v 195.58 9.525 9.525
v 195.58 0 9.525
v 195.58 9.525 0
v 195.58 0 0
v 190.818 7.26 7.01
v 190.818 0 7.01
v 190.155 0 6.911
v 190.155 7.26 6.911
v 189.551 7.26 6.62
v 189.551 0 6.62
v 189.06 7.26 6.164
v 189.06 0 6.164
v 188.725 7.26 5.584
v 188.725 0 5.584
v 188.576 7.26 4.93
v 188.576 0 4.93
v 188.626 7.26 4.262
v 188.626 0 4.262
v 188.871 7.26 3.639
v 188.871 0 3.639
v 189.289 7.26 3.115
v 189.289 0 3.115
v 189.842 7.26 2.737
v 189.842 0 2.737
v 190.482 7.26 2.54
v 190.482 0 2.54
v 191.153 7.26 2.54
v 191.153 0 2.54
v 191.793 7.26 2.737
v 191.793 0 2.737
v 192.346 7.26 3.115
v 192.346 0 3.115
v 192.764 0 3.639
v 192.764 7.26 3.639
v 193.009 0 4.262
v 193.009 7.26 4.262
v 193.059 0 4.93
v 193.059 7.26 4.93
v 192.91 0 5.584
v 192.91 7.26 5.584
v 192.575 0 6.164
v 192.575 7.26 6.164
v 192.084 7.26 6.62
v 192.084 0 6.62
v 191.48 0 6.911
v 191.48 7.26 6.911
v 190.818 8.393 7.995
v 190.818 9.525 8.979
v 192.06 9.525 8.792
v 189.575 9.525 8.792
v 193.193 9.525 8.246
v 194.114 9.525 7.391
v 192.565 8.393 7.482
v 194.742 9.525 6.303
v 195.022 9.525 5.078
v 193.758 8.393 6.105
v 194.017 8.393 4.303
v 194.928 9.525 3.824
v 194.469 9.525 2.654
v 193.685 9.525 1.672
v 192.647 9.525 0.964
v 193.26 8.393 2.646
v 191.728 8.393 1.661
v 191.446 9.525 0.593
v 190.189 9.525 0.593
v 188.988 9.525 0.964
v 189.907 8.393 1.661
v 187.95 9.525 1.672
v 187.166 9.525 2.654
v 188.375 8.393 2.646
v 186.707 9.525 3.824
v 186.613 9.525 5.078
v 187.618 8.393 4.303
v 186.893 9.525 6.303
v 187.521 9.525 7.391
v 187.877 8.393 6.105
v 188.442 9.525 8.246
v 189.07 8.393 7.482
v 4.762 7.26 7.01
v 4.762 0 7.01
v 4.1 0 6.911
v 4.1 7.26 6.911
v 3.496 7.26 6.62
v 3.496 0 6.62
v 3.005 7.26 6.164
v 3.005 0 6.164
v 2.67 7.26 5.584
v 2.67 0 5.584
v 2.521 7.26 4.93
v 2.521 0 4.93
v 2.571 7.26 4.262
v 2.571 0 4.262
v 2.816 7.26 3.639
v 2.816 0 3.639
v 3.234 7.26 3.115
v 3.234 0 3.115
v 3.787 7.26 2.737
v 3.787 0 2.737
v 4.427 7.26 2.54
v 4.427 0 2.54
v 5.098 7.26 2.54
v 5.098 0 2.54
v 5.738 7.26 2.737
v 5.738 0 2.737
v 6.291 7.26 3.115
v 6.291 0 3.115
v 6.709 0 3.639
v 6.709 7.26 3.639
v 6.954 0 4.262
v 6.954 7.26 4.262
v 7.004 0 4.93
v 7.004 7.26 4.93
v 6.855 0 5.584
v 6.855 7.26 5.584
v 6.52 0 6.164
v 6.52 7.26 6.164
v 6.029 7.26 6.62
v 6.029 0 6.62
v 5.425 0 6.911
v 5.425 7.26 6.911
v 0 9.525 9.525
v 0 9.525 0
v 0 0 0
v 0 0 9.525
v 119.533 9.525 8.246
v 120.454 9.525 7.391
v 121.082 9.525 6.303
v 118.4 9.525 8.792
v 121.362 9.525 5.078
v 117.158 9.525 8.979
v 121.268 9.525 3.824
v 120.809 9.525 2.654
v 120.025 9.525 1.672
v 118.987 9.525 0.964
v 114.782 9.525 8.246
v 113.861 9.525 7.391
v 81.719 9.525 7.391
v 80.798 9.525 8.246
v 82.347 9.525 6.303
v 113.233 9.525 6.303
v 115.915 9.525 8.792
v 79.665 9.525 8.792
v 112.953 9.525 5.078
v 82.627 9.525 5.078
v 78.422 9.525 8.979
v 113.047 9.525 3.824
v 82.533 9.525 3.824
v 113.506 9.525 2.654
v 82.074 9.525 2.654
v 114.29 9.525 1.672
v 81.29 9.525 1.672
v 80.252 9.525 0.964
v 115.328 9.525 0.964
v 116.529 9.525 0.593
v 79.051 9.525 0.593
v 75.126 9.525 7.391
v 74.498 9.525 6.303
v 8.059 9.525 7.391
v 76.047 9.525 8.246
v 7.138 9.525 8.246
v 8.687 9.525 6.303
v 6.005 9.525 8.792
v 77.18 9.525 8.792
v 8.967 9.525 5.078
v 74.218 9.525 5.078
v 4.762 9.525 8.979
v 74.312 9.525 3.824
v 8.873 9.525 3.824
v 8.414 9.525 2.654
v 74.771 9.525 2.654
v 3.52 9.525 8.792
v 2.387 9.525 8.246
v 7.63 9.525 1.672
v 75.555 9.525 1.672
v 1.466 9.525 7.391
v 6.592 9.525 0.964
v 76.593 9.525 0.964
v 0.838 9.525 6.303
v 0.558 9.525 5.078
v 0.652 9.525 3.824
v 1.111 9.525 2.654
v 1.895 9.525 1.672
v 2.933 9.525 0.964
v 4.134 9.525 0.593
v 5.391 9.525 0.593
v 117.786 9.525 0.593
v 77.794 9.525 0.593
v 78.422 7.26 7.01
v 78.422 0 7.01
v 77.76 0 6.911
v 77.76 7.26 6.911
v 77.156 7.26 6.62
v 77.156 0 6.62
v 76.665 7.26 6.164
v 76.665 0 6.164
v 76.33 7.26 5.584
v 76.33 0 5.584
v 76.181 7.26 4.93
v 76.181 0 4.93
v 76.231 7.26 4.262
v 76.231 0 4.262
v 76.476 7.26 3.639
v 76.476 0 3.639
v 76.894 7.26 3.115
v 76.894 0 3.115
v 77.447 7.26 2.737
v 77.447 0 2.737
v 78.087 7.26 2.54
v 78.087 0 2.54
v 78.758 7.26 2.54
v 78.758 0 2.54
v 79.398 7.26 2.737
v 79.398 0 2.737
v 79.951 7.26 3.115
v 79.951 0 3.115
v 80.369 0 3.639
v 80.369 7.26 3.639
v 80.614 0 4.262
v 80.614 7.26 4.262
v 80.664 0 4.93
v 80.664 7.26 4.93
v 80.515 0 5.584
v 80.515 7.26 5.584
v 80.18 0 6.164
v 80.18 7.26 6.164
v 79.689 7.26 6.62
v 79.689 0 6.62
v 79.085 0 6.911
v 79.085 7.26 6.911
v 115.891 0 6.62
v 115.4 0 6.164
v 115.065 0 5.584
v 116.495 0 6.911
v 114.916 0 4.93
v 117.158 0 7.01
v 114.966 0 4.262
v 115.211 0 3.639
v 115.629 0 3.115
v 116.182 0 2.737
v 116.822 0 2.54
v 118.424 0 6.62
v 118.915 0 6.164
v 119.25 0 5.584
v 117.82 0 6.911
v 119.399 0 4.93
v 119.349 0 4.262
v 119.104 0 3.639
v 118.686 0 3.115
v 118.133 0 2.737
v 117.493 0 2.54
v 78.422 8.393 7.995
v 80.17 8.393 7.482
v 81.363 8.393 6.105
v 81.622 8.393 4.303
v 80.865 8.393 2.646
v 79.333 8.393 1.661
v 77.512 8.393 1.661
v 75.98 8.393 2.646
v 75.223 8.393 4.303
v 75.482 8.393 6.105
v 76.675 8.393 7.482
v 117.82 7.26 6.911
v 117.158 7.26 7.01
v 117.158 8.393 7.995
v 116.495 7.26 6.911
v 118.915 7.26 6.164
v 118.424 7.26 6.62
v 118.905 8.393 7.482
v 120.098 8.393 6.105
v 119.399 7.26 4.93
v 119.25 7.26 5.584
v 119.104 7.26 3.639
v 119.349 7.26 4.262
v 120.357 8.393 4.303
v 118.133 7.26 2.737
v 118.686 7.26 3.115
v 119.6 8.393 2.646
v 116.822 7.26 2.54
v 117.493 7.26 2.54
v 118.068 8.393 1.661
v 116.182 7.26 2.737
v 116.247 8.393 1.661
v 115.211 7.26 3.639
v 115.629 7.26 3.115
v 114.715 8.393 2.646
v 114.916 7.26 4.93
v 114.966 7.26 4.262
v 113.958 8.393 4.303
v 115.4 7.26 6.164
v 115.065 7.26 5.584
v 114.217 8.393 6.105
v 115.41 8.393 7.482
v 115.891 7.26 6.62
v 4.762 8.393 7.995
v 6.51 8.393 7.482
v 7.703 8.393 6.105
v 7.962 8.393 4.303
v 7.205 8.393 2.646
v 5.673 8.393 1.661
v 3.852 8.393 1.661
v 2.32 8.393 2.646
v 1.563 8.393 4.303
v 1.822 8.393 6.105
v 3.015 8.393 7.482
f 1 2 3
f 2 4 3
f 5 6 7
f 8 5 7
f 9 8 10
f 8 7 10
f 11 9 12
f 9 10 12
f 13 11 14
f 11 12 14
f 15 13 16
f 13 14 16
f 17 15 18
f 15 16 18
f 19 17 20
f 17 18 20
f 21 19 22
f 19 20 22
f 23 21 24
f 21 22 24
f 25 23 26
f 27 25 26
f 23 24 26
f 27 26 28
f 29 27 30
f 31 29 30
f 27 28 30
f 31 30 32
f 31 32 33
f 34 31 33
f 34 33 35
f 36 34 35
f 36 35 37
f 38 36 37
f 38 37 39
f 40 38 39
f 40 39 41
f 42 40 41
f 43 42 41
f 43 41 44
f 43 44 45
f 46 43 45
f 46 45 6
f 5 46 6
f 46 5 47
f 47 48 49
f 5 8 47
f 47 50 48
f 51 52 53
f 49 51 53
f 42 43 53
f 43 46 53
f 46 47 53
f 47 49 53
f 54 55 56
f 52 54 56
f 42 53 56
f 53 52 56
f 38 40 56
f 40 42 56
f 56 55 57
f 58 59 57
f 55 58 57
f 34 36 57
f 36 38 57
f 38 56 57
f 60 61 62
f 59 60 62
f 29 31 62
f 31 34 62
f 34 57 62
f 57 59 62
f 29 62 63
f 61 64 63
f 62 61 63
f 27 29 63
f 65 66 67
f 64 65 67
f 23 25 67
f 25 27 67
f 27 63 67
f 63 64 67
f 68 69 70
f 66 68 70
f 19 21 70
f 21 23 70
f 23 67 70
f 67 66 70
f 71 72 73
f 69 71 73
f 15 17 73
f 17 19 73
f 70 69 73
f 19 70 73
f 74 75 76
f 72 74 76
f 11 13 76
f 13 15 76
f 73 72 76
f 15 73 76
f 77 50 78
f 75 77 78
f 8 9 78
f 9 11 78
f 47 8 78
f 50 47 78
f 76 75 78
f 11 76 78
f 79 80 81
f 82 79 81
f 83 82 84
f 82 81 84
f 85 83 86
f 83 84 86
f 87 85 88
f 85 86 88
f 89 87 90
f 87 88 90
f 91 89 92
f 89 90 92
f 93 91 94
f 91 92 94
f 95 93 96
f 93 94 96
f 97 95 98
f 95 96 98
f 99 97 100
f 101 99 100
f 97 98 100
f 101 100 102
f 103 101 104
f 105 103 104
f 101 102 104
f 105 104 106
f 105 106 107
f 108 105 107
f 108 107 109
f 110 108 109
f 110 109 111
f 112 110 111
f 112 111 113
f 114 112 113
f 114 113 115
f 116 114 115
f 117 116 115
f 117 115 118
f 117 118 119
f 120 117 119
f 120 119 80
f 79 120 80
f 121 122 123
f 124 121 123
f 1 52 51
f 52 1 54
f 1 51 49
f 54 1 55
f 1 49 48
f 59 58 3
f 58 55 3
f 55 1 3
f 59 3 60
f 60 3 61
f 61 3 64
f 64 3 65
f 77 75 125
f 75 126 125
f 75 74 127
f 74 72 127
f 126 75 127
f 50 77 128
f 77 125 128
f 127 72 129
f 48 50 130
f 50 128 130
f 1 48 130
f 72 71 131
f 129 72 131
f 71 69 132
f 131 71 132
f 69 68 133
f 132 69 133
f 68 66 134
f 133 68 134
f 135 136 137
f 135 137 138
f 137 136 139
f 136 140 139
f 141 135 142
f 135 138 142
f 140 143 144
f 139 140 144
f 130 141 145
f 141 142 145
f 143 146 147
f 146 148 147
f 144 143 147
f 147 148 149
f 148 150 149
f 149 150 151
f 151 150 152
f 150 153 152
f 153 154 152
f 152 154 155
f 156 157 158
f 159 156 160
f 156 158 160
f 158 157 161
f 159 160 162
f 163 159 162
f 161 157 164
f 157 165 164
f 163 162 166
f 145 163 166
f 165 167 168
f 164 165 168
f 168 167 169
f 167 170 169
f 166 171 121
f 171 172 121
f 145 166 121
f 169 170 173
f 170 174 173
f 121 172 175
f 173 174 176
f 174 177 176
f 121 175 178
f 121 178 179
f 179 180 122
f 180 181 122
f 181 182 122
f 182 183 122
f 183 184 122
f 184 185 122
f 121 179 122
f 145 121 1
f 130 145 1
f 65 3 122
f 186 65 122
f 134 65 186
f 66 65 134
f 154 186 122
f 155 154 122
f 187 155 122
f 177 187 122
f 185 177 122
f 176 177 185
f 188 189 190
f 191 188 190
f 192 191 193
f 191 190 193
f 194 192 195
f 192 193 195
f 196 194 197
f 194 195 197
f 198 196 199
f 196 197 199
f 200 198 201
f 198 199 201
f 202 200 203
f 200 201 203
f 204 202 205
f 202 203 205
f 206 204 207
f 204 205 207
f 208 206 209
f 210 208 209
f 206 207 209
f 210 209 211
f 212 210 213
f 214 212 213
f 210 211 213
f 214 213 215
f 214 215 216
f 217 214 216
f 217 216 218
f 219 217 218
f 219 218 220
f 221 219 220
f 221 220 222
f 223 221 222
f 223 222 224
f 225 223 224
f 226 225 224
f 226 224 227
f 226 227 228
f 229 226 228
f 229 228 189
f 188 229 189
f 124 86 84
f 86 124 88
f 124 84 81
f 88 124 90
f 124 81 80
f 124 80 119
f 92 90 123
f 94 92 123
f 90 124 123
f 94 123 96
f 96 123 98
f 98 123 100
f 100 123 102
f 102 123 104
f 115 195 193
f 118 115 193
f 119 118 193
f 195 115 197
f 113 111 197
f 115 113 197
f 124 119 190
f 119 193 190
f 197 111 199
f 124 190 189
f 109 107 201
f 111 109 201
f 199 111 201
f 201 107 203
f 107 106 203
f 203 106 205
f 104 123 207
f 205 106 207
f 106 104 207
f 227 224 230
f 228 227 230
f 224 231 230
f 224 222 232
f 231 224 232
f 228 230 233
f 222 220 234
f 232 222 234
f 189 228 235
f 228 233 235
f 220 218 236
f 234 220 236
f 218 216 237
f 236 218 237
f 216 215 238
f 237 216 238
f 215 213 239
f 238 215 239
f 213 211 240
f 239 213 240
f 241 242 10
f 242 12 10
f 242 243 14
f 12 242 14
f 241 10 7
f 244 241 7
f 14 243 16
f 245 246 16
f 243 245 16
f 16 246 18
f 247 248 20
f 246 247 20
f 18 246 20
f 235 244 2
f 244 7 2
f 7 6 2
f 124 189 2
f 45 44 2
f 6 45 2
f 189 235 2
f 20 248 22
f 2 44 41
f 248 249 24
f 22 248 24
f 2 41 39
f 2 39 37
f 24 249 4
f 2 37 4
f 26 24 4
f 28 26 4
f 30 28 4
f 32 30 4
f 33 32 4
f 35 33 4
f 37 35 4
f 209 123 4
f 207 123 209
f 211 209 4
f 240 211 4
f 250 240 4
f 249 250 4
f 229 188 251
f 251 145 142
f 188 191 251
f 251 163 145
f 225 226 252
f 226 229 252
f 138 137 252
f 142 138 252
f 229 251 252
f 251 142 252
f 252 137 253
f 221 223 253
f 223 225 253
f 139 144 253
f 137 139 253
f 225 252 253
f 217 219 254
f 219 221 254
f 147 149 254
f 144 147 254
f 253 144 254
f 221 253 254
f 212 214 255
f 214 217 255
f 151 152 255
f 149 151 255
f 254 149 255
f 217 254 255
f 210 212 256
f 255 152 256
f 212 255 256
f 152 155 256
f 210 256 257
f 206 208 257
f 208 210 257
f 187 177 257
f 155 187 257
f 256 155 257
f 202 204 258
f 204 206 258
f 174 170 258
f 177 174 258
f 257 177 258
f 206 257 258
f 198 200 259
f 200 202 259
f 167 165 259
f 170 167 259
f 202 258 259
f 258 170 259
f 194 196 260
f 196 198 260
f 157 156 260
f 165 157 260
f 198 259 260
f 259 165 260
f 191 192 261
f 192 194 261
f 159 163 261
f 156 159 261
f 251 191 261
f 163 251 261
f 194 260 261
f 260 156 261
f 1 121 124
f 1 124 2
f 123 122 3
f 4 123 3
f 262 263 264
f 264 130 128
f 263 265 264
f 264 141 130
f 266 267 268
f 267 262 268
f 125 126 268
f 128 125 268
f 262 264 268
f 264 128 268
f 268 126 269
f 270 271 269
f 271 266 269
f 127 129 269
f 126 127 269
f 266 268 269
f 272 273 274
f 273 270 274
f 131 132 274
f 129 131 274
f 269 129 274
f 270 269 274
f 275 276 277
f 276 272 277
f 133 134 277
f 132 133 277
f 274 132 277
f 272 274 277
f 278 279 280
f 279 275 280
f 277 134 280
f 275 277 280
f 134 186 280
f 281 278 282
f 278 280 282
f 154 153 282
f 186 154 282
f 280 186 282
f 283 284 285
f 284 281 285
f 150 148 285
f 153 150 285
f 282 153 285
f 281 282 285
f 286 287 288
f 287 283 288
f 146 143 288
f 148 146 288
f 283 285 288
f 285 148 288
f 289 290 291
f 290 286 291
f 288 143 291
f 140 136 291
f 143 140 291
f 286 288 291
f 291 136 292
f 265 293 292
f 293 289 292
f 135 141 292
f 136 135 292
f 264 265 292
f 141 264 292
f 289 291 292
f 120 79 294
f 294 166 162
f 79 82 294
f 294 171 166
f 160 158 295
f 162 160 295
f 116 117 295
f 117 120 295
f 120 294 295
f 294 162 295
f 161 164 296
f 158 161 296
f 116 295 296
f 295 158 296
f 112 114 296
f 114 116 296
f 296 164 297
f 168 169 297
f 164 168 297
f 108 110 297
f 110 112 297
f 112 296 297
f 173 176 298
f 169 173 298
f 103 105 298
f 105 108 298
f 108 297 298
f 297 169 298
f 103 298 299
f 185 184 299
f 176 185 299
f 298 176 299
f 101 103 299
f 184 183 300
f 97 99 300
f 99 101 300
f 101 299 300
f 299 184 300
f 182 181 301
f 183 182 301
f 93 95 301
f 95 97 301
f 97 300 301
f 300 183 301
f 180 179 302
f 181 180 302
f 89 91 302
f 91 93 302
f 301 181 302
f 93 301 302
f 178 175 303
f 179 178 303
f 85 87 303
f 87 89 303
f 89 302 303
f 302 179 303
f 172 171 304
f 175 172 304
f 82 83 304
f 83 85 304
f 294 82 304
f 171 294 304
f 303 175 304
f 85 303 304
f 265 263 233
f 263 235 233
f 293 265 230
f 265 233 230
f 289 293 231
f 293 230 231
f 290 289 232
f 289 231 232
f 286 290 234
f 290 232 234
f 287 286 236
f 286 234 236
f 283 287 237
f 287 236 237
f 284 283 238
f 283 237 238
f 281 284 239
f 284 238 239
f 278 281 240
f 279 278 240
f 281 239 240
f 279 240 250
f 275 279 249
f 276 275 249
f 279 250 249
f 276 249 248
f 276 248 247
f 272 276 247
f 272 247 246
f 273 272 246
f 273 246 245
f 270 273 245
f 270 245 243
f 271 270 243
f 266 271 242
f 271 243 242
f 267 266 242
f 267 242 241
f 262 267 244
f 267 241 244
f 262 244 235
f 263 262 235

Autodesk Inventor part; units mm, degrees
ref_plane "YZ Plane" through (0, 0, 0) normal (1, 0, 0) x (0, 1, 0)
ref_plane "XZ Plane" through (0, 0, 0) normal (0, 1, 0) x (-1, 0, 0)
ref_plane "XY Plane" through (0, 0, 0) normal (0, 0, 1) x (1, 0, 0)
sketch "Sketch1" plane through (0, 0, 0) normal (0, 0, 1) x (1, 0, 0)
  line L0 (0, 0) -> (195.58, 0)
  line L1 (195.58, 0) -> (195.58, 9.525)
  line L2 (195.58, 9.525) -> (0, 9.525)
  line L3 (0, 9.525) -> (0, 0)
  dimension "d0" = 9.525
  dimension "d1" = 195.58
extrude "Extrusion1" add sketch "Sketch1" along normal blind 9.525
sketch "Sketch2" plane through (0, 9.525, 0) normal (0, 1, 0) x (1, 0, 0)
  line L0 (195.58, 0) -> (0, 0) projected
  line L1 (9.525, 0) -> (9.525, -9.525) projected
  line L2 (73.66, -9.525) -> (73.66, 0) projected
  line L3 (83.185, 0) -> (83.185, -9.525) projected
  line L4 (112.395, 0) -> (112.395, -9.525) projected
  line L5 (121.92, -9.525) -> (121.92, 0) projected
  line L6 (186.055, 0) -> (186.055, -9.525) projected
  point P0 (4.7625, -4.7625)
  point P1 (78.4225, -4.7625)
  point P2 (117.1575, -4.7625)
  point P3 (190.8175, -4.7625)
  dimension "d4" = 4.7625
  dimension "d5" = 4.7625
  dimension "d6" = 4.7625
  dimension "d7" = 4.7625
  dimension "d8" = 4.7625
  dimension "d9" = 4.7625
  dimension "d10" = 4.7625
  dimension "d11" = 4.7625
hole "Hole1" at (4.7625, 9.525, 4.7625) at (78.4225, 9.525, 4.7625) at (117.1575, 9.525, 4.7625) at (190.8175, 9.525, 4.7625) direction (0, -1, 0) diameter 4.4958 end through all countersink diameter 8.4328 countersink angle 82 clearance for "Flat Head Machine Screw (82)" size "#8" standard "Ansi Unified Screw Threads"
properties part number "SupportBar" material "Aluminum-6061"
